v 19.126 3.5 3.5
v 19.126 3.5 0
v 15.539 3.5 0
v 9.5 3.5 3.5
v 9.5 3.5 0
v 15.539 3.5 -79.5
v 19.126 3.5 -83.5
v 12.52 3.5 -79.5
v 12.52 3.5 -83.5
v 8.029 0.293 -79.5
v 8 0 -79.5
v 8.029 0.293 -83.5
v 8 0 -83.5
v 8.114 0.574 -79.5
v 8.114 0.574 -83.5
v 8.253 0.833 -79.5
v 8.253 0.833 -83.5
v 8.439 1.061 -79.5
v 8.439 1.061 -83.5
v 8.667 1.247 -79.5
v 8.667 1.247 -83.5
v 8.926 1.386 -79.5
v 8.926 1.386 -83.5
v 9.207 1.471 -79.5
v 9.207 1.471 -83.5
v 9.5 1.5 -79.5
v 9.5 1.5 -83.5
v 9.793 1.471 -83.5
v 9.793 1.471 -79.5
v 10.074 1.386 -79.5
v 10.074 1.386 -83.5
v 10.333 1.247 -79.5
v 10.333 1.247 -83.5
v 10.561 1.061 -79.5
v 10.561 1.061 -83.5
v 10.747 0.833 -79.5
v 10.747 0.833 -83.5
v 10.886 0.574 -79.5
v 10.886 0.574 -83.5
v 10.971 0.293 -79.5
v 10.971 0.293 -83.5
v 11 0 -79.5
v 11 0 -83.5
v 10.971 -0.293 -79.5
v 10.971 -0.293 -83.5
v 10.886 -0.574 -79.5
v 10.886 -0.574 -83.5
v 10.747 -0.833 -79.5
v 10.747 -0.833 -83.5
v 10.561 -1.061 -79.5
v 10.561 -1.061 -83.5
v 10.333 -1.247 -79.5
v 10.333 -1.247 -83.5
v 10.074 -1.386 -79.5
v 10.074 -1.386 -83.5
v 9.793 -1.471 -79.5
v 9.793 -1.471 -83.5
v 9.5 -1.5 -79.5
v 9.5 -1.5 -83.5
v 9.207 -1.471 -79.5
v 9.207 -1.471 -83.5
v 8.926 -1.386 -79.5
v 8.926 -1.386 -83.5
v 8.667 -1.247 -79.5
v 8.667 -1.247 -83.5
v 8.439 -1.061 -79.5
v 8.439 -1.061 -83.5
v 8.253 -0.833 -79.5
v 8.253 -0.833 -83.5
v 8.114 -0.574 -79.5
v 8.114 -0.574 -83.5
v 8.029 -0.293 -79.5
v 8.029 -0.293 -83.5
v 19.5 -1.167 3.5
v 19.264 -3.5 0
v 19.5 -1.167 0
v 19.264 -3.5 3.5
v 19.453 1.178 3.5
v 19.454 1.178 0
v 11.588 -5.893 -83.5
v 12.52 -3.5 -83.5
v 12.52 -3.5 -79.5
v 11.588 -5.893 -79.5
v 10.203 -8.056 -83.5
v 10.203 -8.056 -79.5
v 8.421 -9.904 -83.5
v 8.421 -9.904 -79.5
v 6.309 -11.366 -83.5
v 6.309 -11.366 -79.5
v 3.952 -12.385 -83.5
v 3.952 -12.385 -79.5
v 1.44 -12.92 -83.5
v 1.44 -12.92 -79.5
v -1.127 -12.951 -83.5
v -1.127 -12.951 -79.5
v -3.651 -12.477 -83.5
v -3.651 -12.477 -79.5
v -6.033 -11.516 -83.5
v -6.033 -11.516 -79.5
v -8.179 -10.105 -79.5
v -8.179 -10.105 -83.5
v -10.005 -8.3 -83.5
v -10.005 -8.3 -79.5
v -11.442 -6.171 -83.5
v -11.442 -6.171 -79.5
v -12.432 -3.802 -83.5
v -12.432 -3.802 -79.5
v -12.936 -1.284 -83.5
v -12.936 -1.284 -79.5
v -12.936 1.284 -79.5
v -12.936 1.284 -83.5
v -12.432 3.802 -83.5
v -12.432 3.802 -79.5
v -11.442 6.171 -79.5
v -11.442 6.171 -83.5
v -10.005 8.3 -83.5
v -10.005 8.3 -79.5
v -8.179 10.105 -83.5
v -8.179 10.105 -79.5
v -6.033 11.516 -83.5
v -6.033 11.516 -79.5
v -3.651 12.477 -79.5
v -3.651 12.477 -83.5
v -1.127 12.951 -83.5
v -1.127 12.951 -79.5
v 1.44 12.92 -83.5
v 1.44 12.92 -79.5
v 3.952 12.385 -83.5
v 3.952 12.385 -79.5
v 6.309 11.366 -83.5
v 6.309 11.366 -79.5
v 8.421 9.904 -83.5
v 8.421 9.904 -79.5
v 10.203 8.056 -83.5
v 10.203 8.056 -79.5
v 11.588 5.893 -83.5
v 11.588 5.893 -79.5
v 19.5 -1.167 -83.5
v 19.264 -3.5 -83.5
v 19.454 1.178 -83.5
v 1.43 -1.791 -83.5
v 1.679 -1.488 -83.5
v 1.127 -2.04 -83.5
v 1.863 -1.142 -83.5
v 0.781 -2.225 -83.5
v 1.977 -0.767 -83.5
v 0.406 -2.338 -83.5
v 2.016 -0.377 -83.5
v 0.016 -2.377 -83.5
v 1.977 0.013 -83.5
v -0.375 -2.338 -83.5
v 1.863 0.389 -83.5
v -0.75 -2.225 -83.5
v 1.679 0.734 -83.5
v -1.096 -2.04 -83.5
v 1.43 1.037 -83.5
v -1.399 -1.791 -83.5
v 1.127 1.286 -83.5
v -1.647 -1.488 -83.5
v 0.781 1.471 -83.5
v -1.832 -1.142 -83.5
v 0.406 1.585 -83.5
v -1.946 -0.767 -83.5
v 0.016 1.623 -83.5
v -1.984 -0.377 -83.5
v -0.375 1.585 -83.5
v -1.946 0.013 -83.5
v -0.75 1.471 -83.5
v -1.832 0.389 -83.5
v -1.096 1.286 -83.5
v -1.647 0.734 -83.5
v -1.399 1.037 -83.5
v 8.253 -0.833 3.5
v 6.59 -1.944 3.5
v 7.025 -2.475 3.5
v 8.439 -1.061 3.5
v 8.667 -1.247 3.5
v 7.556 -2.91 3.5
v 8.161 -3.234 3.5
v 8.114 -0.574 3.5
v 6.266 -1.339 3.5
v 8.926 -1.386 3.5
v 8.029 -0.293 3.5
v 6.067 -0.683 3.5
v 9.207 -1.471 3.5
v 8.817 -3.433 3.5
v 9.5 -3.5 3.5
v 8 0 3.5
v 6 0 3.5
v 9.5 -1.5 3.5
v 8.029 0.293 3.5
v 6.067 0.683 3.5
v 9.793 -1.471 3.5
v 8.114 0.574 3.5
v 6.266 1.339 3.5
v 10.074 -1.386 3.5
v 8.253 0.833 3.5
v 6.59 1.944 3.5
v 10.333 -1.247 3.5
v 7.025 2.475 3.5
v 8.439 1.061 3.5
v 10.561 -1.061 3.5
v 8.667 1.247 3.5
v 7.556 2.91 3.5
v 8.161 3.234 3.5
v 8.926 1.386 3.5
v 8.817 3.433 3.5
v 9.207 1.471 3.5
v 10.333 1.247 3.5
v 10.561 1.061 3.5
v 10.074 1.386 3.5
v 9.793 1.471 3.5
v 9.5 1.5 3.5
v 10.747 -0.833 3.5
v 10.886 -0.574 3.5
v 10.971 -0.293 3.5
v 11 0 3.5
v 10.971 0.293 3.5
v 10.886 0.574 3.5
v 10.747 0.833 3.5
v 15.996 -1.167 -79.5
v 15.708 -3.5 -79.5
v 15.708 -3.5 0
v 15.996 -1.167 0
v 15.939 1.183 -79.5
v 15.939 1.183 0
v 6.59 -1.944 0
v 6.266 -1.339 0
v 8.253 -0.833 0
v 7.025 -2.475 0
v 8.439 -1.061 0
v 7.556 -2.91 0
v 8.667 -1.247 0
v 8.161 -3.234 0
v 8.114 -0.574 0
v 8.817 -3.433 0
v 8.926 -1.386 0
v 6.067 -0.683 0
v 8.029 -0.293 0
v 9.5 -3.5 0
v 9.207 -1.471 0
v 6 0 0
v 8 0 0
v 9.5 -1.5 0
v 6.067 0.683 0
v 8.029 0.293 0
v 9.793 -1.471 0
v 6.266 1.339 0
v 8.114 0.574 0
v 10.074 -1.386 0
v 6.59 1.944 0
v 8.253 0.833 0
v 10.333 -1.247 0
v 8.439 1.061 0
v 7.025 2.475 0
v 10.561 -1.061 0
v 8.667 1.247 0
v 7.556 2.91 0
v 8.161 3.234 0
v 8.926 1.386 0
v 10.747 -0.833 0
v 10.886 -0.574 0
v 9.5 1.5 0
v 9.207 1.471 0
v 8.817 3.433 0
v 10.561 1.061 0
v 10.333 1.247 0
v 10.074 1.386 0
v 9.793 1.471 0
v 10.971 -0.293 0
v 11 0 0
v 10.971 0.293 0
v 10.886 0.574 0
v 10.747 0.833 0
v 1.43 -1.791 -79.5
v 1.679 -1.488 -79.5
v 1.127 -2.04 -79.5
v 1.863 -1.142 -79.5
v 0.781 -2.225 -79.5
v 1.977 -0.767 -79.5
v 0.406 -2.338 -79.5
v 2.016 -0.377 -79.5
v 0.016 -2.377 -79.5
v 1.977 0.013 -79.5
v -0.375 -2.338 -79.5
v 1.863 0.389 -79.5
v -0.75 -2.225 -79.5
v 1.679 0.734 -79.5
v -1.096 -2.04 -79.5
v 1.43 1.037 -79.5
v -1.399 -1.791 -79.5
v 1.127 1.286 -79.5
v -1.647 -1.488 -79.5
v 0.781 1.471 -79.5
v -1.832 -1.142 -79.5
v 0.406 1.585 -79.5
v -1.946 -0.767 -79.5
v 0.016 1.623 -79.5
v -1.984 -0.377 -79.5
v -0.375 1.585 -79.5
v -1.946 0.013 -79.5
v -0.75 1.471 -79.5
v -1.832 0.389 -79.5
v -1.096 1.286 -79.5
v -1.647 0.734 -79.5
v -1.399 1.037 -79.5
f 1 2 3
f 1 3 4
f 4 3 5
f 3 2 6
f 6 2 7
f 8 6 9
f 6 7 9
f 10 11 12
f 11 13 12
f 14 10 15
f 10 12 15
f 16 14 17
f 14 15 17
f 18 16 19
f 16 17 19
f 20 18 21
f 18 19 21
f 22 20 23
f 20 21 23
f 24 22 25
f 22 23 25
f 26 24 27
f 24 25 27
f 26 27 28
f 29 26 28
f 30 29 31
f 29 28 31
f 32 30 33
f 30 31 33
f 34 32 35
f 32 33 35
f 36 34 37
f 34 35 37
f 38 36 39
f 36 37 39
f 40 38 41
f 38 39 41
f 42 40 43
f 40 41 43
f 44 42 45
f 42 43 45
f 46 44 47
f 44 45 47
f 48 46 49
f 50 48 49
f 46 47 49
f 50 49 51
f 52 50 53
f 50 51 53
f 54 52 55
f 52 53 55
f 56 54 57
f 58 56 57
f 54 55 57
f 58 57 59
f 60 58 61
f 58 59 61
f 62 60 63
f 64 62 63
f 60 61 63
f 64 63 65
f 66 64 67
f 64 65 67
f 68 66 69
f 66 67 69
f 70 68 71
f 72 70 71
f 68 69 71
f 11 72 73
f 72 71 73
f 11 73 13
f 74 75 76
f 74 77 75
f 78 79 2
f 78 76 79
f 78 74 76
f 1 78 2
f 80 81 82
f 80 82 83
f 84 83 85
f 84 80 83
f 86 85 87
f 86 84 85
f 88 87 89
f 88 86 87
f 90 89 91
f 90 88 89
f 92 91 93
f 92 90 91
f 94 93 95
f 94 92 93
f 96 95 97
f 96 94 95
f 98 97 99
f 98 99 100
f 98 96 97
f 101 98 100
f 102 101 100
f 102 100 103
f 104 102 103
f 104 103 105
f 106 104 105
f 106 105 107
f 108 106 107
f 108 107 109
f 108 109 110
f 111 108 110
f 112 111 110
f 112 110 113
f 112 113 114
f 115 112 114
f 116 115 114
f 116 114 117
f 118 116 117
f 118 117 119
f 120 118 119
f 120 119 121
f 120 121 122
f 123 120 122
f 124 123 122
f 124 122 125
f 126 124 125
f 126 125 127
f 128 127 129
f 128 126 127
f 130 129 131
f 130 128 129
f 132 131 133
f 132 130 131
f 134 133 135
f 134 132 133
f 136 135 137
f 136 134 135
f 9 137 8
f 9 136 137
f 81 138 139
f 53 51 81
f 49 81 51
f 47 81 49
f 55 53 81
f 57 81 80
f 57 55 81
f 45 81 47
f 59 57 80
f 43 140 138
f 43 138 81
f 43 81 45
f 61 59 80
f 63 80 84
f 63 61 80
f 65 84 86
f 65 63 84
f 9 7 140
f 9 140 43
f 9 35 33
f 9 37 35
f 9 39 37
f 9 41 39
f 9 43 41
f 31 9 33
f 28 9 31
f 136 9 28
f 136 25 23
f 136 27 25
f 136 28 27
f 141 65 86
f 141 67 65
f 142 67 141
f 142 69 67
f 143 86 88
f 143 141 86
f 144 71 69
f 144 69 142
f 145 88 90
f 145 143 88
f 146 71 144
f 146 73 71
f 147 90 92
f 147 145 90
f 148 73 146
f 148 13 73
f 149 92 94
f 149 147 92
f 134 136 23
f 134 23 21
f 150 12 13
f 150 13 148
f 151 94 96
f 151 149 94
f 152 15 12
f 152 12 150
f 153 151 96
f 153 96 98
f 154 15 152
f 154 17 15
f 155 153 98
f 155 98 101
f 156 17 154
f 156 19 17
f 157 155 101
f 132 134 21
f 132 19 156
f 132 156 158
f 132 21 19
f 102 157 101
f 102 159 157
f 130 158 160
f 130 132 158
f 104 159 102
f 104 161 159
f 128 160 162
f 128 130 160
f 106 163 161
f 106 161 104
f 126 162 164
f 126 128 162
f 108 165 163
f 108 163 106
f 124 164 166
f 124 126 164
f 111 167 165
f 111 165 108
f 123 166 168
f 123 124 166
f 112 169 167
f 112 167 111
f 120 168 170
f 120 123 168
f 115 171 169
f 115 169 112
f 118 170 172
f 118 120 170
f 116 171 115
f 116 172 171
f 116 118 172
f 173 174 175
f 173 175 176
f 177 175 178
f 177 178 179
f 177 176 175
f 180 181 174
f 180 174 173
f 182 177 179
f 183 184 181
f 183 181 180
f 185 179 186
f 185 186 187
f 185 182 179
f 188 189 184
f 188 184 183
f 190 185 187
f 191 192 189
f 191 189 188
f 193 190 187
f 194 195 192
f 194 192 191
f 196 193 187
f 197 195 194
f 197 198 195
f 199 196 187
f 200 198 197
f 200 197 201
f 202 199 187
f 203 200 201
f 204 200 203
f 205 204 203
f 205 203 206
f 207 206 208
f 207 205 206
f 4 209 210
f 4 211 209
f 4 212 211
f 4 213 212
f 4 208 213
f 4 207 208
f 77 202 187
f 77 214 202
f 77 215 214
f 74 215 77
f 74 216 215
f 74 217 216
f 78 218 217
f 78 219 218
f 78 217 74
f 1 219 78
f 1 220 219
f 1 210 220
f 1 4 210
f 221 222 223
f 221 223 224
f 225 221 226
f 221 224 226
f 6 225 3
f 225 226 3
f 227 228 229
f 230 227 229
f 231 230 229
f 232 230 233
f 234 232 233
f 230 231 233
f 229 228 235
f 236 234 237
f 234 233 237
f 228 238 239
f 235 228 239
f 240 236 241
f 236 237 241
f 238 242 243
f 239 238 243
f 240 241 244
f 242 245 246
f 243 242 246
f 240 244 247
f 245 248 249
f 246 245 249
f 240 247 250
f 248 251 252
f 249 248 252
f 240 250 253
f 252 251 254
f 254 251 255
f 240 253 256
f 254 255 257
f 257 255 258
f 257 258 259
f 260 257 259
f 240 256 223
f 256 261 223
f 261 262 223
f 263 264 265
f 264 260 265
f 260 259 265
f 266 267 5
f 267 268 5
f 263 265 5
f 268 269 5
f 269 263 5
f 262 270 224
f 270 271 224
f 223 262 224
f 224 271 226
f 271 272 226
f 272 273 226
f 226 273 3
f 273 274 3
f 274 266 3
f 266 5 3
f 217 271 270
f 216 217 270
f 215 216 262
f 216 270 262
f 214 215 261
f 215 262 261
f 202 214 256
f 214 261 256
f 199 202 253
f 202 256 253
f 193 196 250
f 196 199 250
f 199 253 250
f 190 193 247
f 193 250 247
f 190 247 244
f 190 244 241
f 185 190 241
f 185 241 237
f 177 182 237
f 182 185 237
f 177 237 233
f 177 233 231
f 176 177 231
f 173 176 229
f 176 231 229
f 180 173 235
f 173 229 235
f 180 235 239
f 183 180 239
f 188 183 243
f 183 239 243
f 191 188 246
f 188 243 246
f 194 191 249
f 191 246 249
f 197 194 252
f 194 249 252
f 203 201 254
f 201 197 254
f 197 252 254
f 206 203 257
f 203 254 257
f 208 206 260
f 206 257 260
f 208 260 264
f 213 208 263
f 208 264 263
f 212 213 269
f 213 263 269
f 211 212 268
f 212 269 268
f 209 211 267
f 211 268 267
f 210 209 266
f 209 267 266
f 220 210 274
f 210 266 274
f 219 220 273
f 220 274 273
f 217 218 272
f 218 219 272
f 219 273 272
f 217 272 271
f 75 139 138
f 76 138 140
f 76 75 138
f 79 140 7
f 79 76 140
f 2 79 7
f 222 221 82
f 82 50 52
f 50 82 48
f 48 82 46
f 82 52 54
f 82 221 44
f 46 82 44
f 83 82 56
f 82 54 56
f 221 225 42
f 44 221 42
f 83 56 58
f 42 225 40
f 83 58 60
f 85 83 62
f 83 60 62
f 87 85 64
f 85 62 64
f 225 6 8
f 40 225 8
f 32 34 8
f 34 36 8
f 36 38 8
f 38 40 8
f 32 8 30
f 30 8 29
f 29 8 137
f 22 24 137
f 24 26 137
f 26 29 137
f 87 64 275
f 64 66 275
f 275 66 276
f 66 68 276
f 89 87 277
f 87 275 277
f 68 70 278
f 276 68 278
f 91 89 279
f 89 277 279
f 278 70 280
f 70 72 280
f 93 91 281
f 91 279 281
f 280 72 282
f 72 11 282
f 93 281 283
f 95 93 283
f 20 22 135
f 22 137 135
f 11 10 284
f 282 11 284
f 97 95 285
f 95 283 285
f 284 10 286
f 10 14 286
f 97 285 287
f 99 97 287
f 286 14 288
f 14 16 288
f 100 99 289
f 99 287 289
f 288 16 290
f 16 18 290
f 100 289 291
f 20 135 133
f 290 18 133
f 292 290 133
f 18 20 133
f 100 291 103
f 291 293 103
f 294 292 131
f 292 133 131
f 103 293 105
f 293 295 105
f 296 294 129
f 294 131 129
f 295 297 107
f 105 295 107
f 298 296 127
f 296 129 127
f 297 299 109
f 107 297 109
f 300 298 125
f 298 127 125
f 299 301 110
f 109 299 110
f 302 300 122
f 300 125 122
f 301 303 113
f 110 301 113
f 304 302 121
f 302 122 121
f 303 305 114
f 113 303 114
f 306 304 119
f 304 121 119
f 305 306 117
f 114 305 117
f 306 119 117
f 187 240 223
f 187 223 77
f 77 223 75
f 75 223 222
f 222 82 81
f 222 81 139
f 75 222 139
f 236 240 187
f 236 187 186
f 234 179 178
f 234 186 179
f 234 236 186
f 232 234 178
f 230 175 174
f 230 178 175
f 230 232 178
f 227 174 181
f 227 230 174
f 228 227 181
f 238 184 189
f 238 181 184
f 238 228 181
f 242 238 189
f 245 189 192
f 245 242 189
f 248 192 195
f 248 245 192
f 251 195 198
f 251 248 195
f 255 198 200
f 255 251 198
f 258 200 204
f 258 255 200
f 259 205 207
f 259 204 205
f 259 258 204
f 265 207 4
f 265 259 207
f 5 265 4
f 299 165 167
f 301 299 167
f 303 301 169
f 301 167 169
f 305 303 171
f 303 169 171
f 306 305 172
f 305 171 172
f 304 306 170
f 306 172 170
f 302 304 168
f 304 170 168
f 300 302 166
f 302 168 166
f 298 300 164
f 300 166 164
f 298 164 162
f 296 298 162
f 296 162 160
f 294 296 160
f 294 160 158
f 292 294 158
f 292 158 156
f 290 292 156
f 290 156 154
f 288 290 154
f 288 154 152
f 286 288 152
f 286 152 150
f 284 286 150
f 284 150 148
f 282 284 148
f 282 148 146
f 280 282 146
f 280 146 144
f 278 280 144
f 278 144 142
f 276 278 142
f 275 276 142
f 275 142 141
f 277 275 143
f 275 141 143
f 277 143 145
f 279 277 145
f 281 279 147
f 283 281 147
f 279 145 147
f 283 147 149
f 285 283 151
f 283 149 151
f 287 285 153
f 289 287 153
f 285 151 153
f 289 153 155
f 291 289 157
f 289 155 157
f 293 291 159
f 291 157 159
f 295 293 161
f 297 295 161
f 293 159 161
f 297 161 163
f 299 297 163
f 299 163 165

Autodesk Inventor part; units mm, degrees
ref_plane "YZ Plane" through (0, 0, 0) normal (1, 0, 0) x (0, 1, 0)
ref_plane "XZ Plane" through (0, 0, 0) normal (0, 1, 0) x (-1, 0, 0)
ref_plane "Work Plane1" through (-0.1632, 0, 0) normal (0, 0, 1) x (1, 0, 0)
sketch "Sketch1" plane through (-0.1632, 0, 0) normal (0, 0, 1) x (1, 0, 0)
  circle A0 centre (9.6632, 0) radius 1.5 projected
  line L0 (12.6832, 3.5) -> (9.6632, 3.5) projected
  arc A1 (9.6632, 3.5) -> (9.6632, -3.5) centre (9.6632, 0) ccw projected
  line L1 (9.6632, -3.5) -> (12.6832, -3.5) projected
  arc A2 (12.6832, -3.5) -> (12.6832, 3.5) centre (0.1632, 0) ccw projected
  circle A3 centre (0.1788, -0.3768) radius 14 projected
  circle A4 centre (0.1788, -0.3768) radius 11 projected
  line L2 (12.6832, -3.5) -> (18.2293, -3.5)
  line L3 (12.6832, 3.5) -> (18.7282, 3.5)
  circle A5 centre (0.1788, -0.3768) radius 16.5
  line L4 (16.6788, -0.3768) -> (20.6788, -0.3768)
  circle A6 centre (0.1788, -0.3768) radius 20.5
  line L5 (18.7282, 3.5) -> (20.3088, 3.5)
  line L6 (18.2293, -3.5) -> (20.4394, -3.5)
  point P0 (0.1632, 0)
  dimension "d0" = 33
  dimension "d1" = 4
extrude "Extrusion1" add sketch "Sketch1" along normal blind 3.5 contours A2 L1 A4 L0 | L3 A3 L2 A2 | A4 L1 A1 L0 | L3 A5 L2 A3 | L3 L5 A6 L4 A5 | A5 L4 A6 L6 L2 picked at (10.1281, -2.4909) picked at (14.5943, 3.0756)
sketch "Sketch2" plane through (-0.1632, 0, 0) normal (0, 0, -1) x (-1, 0, 0)
  line L0 (-9.6632, -3.5) -> (-20.4394, -3.5) projected
  arc A0 (-9.6632, -3.5) -> (-9.6632, 3.5) centre (-9.6632, 0) ccw projected
  line L1 (-20.3088, 3.5) -> (-9.6632, 3.5) projected
  arc A1 (-20.3088, 3.5) -> (-20.4394, -3.5) centre (-0.1788, -0.3768) ccw projected
  circle A2 centre (-9.6632, 0) radius 1.5 projected
  circle A3 centre (-0.1788, -0.3768) radius 14 projected
  line L2 (-14.1788, -0.3768) -> (-16.1788, -0.3768)
  circle A4 centre (-0.1788, -0.3768) radius 16
  line L3 (-16.1788, -0.3768) -> (-19.6788, -0.3768)
  circle A5 centre (-0.1788, -0.3768) radius 19.5
  circle A6 centre (-0.1788, -0.3768) radius 2 projected
  point P0 (-0.1632, 0)
  point P1 (-19.427, -3.5)
  point P2 (-15.871, -3.5)
  point P3 (-15.702, 3.5)
  point P4 (-19.2895, 3.5)
  dimension "d4" = 2
  dimension "d5" = 3.5
ref_plane "Work Plane2" through (-13.9845, -14.3768, -78) normal (0, 0, -1) x (0, 1, 0)
extrude "Extrusion2" add sketch "Sketch2" along normal blind 83.5 contours L0 A5 L3 A4 | L3 A5 L1 A4
sketch "Sketch3" plane through (-0.1632, 0, -83.5) normal (0, 0, -1) x (-1, 0, 0)
  circle A0 centre (-0.1788, -0.3768) radius 14 projected
  circle A1 centre (-9.6632, 0) radius 1.5 projected
  arc A2 (-15.702, 3.5) -> (-15.871, -3.5) centre (-0.1788, -0.3768) ccw projected
  line L0 (-9.6632, -3.5) -> (-15.871, -3.5) projected
  arc A3 (-9.6632, -3.5) -> (-9.6632, 3.5) centre (-9.6632, 0) ccw projected
  line L1 (-15.702, 3.5) -> (-9.6632, 3.5) projected
  circle A4 centre (-0.1788, -0.3768) radius 2
  arc A5 (-9.6632, -3.5) -> (-9.6632, 3.5) centre (-9.6632, 0) ccw projected
  line L2 (-9.6632, 3.5) -> (-12.6832, 3.5) projected
  arc A6 (-12.6832, -3.5) -> (-12.6832, 3.5) centre (-0.1632, 0) ccw projected
  line L3 (-12.6832, -3.5) -> (-9.6632, -3.5) projected
  line L4 (3.8368, -5) -> (-4.1632, -5) projected
  line L5 (3.8368, 5) -> (3.8368, -5) projected
  line L6 (-4.1632, 5) -> (3.8368, 5) projected
  line L7 (-4.1632, -5) -> (-4.1632, 5) projected
  point P0 (-0.1632, 0)
  dimension "d8" = 4
extrude "Extrusion3" add sketch "Sketch3" against normal blind 4 contours L1 A3 L0 A0 | A0 L0 A2 L1 | A6 L0 A3 L1 | L4 L7 L6 L5
sketch "Sketch4" plane through (-0.1632, 0, 3.5) normal (0, 0, 1) x (1, 0, 0)
  arc A0 (19.427, -3.5) -> (19.2895, 3.5) centre (0.1788, -0.3768) ccw projected
  arc A1 (19.427, -3.5) -> (19.2895, 3.5) centre (0.1788, -0.3768) ccw projected
  arc A2 (15.871, -3.5) -> (15.702, 3.5) centre (0.1788, -0.3768) ccw projected
  line L0 (9.6632, -3.5) -> (20.4394, -3.5) projected
  arc A3 (20.4394, -3.5) -> (20.3088, 3.5) centre (0.1788, -0.3768) ccw projected
  line L1 (20.3088, 3.5) -> (9.6632, 3.5) projected
  arc A4 (9.6632, 3.5) -> (9.6632, -3.5) centre (9.6632, 0) ccw projected
  circle A5 centre (9.6632, 0) radius 1.5 projected
  point P0 (0.1632, 0)
  point P1 (19.2895, 3.5)
  point P2 (19.427, -3.5)
extrude "Extrusion4" cut sketch "Sketch4" against normal blind 4 contours A0 L1 A3 L0
properties material "PC/ABS Plastic"
